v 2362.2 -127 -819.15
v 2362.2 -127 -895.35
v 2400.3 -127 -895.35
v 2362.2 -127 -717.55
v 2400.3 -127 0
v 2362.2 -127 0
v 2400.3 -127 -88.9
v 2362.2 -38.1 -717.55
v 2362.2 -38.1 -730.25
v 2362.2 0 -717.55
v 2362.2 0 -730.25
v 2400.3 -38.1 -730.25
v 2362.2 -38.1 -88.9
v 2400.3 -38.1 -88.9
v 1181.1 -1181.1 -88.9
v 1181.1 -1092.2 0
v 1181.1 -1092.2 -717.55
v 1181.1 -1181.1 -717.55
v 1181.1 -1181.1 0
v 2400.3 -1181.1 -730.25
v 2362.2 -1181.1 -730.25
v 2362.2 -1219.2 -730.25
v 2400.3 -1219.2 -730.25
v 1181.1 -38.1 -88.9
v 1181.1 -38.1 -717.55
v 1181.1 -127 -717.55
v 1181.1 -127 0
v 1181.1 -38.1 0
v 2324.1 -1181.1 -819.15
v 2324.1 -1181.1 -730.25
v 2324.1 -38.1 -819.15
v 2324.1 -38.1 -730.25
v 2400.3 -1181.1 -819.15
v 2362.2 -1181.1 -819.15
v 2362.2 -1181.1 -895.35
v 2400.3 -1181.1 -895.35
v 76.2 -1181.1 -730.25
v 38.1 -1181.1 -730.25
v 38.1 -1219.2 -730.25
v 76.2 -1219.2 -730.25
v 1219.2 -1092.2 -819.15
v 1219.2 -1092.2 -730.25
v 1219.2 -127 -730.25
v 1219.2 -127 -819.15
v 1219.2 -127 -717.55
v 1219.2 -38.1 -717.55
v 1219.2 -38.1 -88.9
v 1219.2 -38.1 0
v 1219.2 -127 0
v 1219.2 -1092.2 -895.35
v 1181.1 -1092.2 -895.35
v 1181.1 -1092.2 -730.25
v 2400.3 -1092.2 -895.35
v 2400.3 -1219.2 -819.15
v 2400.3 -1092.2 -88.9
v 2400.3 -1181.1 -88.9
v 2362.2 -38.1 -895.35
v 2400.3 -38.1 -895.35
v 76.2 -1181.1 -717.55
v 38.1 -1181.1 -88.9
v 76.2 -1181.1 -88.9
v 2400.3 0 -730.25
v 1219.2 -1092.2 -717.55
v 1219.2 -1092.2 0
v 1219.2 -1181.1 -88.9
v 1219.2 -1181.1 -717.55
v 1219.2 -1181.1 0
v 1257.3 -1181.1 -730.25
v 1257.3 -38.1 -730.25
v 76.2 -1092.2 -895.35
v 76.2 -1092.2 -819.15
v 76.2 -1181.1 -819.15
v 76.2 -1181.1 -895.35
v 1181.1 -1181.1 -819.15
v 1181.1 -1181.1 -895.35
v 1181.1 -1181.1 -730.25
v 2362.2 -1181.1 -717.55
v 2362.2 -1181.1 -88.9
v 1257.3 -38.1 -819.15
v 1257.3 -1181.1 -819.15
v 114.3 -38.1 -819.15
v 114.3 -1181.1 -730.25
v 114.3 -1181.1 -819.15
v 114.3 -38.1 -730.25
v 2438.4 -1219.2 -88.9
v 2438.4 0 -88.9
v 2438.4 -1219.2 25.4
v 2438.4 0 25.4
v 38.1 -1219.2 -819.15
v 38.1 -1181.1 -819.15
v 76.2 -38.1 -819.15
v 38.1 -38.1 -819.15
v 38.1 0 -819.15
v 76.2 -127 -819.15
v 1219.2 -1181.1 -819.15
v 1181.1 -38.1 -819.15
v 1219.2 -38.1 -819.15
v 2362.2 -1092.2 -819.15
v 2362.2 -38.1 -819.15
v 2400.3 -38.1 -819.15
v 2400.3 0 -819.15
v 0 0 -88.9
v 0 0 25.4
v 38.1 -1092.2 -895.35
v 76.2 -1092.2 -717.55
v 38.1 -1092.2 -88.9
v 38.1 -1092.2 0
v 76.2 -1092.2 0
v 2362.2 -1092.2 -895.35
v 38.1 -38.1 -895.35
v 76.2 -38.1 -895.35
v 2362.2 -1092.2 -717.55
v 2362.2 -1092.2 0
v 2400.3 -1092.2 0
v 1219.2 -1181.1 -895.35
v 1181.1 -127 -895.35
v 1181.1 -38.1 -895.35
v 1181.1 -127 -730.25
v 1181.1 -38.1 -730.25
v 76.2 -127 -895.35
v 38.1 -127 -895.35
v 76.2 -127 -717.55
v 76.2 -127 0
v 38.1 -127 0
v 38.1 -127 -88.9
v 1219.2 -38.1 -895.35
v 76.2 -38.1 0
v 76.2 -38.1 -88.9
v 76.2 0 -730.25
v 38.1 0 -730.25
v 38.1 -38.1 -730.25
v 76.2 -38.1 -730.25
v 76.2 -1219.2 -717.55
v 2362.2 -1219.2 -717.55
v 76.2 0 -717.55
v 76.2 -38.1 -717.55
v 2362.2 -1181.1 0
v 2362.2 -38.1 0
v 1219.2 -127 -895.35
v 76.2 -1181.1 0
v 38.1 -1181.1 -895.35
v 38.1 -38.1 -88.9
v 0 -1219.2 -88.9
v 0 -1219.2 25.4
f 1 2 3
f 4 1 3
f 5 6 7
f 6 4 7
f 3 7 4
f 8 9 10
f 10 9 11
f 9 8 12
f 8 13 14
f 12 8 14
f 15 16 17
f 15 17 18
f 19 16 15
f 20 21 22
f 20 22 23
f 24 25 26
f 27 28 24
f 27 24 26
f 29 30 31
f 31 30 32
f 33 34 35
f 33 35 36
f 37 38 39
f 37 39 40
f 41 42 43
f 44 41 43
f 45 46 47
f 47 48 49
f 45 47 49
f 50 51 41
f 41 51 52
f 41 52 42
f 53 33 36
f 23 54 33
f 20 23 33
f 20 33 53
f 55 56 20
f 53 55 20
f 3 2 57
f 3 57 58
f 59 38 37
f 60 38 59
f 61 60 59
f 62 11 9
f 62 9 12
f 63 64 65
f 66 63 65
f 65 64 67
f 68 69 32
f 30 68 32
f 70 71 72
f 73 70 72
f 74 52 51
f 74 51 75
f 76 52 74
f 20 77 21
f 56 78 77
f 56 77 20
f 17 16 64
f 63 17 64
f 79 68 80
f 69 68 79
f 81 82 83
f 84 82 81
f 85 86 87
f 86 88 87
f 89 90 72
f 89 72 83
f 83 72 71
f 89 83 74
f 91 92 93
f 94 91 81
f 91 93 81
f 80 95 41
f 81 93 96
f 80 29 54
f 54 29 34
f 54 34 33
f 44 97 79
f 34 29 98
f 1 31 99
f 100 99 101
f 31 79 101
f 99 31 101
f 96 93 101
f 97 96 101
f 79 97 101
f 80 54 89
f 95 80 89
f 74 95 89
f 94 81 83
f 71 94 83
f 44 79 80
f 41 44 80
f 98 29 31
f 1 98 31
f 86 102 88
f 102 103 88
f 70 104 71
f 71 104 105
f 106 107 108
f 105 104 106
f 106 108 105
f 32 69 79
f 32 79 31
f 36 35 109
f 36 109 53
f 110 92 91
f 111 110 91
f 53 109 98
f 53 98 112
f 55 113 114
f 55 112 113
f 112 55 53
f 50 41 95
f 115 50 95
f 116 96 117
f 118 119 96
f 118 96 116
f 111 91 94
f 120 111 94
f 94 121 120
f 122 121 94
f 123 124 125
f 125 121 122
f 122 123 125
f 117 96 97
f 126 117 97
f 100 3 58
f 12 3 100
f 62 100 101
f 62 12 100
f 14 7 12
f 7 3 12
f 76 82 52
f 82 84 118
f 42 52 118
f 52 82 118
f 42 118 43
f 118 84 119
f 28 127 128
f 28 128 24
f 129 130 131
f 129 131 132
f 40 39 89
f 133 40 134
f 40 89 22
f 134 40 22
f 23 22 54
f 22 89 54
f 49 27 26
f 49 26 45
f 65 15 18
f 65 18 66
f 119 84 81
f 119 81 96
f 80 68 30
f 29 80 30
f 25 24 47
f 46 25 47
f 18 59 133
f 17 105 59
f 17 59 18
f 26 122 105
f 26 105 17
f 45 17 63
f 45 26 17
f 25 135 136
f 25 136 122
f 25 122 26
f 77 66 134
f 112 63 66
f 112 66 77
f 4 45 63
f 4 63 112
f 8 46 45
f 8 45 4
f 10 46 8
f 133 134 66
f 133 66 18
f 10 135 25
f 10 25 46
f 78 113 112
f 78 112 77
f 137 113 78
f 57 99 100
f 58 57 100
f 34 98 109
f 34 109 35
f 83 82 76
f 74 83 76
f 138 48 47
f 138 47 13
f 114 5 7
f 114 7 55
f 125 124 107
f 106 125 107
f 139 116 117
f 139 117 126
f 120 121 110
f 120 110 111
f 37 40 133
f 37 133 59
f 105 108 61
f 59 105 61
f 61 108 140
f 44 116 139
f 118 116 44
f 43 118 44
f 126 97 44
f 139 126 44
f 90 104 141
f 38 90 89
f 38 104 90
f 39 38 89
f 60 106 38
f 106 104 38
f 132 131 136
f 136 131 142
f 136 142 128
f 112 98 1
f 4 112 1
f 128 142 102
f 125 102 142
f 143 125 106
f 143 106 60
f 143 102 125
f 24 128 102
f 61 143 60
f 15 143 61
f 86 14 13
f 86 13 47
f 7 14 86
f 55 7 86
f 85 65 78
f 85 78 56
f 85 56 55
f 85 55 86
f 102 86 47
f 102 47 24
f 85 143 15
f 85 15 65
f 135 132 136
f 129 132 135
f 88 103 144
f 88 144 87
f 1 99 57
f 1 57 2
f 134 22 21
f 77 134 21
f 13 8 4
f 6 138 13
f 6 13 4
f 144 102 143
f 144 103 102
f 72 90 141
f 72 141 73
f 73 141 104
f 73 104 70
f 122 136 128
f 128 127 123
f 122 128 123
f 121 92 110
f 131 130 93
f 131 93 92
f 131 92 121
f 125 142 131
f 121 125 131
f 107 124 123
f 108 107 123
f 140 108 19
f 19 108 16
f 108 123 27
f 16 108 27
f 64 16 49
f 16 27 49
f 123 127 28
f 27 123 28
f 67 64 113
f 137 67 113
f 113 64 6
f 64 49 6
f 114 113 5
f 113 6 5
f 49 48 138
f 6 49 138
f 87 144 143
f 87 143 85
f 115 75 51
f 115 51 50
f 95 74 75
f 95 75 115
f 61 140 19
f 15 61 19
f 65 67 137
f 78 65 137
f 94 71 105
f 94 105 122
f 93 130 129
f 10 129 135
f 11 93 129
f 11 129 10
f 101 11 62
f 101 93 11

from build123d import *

# Parameters (mm, degrees)
F0_W      = 2438.4
F0_H      = 1219.2
F1_DEPTH  = 25.4
F2_W      = 2438.4
F2_H      = 1219.2
F2_W_2    = 2362.2
F2_H_2    = 1143
F3_DEPTH  = 88.9
F4_W      = 38.1
F4_H      = 88.9
F5_DEPTH  = 895.35
F7_W      = 1104.9
F7_H      = 1143
F7_W_2    = 1066.8
F8_DEPTH  = 88.9
F9_W      = 2286
F9_H      = 1219.2
F10_DEPTH = 12.7


with BuildPart() as f1:
    # F0 (on Top) → F1 (new body)
    with BuildSketch(Plane.XY):
        with Locations((1219.2, -609.6)):
            Rectangle(F0_W, F0_H)
    extrude(amount=F1_DEPTH)

    # F2 (on face) → F3 (join)
    with BuildSketch(Plane(origin=(0, 0, 0), x_dir=(1, 0, 0), z_dir=(0, 0, -1))):
        with Locations((1219.2, 609.6)):
            Rectangle(F2_W, F2_H)
        with Locations((1219.2, 609.6)):
            Rectangle(F2_W_2, F2_H_2, mode=Mode.SUBTRACT)
    extrude(amount=F3_DEPTH)

    # F4 (on face) → F5 (join)
    with BuildSketch(Plane(origin=(0, 0, 0), x_dir=(1, 0, 0), z_dir=(0, 0, -1))):
        with Locations((57.15, 1136.65)):
            Rectangle(F4_W, F4_H)
        with Locations((57.15, 82.55)):
            Rectangle(F4_W, F4_H)
        with Locations((2381.25, 1136.65)):
            Rectangle(F4_W, F4_H)
        with Locations((2381.25, 82.55)):
            Rectangle(F4_W, F4_H)
        with Locations((1200.15, 1136.65)):
            Rectangle(F4_W, F4_H)
        with Locations((1200.15, 82.55)):
            Rectangle(F4_W, F4_H)
    extrude(amount=F5_DEPTH)

    # F7 (on offset) → F8 (join)
    with BuildSketch(Plane.XY.offset(-730.25)):
        Polygon((2400.3, 0), (38.1, 0), (38.1, -38.1), (76.2, -38.1), (76.2, -1181.1), (38.1, -1181.1), (38.1, -1219.2), (2400.3, -1219.2), (2400.3, -1181.1), (2362.2, -1181.1), (2362.2, -38.1), (2400.3, -38.1), align=None)
        with Locations((666.75, -609.6)):
            Rectangle(F7_W, F7_H, mode=Mode.SUBTRACT)
        with Locations((1790.7, -609.6)):
            Rectangle(F7_W_2, F7_H, mode=Mode.SUBTRACT)
    extrude(amount=-F8_DEPTH)

    # F9 (on offset) → F10 (join)
    with BuildSketch(Plane.XY.offset(-730.25)):
        with Locations((1219.2, -609.6)):
            Rectangle(F9_W, F9_H)
    extrude(amount=F10_DEPTH)


solid = f1.part
